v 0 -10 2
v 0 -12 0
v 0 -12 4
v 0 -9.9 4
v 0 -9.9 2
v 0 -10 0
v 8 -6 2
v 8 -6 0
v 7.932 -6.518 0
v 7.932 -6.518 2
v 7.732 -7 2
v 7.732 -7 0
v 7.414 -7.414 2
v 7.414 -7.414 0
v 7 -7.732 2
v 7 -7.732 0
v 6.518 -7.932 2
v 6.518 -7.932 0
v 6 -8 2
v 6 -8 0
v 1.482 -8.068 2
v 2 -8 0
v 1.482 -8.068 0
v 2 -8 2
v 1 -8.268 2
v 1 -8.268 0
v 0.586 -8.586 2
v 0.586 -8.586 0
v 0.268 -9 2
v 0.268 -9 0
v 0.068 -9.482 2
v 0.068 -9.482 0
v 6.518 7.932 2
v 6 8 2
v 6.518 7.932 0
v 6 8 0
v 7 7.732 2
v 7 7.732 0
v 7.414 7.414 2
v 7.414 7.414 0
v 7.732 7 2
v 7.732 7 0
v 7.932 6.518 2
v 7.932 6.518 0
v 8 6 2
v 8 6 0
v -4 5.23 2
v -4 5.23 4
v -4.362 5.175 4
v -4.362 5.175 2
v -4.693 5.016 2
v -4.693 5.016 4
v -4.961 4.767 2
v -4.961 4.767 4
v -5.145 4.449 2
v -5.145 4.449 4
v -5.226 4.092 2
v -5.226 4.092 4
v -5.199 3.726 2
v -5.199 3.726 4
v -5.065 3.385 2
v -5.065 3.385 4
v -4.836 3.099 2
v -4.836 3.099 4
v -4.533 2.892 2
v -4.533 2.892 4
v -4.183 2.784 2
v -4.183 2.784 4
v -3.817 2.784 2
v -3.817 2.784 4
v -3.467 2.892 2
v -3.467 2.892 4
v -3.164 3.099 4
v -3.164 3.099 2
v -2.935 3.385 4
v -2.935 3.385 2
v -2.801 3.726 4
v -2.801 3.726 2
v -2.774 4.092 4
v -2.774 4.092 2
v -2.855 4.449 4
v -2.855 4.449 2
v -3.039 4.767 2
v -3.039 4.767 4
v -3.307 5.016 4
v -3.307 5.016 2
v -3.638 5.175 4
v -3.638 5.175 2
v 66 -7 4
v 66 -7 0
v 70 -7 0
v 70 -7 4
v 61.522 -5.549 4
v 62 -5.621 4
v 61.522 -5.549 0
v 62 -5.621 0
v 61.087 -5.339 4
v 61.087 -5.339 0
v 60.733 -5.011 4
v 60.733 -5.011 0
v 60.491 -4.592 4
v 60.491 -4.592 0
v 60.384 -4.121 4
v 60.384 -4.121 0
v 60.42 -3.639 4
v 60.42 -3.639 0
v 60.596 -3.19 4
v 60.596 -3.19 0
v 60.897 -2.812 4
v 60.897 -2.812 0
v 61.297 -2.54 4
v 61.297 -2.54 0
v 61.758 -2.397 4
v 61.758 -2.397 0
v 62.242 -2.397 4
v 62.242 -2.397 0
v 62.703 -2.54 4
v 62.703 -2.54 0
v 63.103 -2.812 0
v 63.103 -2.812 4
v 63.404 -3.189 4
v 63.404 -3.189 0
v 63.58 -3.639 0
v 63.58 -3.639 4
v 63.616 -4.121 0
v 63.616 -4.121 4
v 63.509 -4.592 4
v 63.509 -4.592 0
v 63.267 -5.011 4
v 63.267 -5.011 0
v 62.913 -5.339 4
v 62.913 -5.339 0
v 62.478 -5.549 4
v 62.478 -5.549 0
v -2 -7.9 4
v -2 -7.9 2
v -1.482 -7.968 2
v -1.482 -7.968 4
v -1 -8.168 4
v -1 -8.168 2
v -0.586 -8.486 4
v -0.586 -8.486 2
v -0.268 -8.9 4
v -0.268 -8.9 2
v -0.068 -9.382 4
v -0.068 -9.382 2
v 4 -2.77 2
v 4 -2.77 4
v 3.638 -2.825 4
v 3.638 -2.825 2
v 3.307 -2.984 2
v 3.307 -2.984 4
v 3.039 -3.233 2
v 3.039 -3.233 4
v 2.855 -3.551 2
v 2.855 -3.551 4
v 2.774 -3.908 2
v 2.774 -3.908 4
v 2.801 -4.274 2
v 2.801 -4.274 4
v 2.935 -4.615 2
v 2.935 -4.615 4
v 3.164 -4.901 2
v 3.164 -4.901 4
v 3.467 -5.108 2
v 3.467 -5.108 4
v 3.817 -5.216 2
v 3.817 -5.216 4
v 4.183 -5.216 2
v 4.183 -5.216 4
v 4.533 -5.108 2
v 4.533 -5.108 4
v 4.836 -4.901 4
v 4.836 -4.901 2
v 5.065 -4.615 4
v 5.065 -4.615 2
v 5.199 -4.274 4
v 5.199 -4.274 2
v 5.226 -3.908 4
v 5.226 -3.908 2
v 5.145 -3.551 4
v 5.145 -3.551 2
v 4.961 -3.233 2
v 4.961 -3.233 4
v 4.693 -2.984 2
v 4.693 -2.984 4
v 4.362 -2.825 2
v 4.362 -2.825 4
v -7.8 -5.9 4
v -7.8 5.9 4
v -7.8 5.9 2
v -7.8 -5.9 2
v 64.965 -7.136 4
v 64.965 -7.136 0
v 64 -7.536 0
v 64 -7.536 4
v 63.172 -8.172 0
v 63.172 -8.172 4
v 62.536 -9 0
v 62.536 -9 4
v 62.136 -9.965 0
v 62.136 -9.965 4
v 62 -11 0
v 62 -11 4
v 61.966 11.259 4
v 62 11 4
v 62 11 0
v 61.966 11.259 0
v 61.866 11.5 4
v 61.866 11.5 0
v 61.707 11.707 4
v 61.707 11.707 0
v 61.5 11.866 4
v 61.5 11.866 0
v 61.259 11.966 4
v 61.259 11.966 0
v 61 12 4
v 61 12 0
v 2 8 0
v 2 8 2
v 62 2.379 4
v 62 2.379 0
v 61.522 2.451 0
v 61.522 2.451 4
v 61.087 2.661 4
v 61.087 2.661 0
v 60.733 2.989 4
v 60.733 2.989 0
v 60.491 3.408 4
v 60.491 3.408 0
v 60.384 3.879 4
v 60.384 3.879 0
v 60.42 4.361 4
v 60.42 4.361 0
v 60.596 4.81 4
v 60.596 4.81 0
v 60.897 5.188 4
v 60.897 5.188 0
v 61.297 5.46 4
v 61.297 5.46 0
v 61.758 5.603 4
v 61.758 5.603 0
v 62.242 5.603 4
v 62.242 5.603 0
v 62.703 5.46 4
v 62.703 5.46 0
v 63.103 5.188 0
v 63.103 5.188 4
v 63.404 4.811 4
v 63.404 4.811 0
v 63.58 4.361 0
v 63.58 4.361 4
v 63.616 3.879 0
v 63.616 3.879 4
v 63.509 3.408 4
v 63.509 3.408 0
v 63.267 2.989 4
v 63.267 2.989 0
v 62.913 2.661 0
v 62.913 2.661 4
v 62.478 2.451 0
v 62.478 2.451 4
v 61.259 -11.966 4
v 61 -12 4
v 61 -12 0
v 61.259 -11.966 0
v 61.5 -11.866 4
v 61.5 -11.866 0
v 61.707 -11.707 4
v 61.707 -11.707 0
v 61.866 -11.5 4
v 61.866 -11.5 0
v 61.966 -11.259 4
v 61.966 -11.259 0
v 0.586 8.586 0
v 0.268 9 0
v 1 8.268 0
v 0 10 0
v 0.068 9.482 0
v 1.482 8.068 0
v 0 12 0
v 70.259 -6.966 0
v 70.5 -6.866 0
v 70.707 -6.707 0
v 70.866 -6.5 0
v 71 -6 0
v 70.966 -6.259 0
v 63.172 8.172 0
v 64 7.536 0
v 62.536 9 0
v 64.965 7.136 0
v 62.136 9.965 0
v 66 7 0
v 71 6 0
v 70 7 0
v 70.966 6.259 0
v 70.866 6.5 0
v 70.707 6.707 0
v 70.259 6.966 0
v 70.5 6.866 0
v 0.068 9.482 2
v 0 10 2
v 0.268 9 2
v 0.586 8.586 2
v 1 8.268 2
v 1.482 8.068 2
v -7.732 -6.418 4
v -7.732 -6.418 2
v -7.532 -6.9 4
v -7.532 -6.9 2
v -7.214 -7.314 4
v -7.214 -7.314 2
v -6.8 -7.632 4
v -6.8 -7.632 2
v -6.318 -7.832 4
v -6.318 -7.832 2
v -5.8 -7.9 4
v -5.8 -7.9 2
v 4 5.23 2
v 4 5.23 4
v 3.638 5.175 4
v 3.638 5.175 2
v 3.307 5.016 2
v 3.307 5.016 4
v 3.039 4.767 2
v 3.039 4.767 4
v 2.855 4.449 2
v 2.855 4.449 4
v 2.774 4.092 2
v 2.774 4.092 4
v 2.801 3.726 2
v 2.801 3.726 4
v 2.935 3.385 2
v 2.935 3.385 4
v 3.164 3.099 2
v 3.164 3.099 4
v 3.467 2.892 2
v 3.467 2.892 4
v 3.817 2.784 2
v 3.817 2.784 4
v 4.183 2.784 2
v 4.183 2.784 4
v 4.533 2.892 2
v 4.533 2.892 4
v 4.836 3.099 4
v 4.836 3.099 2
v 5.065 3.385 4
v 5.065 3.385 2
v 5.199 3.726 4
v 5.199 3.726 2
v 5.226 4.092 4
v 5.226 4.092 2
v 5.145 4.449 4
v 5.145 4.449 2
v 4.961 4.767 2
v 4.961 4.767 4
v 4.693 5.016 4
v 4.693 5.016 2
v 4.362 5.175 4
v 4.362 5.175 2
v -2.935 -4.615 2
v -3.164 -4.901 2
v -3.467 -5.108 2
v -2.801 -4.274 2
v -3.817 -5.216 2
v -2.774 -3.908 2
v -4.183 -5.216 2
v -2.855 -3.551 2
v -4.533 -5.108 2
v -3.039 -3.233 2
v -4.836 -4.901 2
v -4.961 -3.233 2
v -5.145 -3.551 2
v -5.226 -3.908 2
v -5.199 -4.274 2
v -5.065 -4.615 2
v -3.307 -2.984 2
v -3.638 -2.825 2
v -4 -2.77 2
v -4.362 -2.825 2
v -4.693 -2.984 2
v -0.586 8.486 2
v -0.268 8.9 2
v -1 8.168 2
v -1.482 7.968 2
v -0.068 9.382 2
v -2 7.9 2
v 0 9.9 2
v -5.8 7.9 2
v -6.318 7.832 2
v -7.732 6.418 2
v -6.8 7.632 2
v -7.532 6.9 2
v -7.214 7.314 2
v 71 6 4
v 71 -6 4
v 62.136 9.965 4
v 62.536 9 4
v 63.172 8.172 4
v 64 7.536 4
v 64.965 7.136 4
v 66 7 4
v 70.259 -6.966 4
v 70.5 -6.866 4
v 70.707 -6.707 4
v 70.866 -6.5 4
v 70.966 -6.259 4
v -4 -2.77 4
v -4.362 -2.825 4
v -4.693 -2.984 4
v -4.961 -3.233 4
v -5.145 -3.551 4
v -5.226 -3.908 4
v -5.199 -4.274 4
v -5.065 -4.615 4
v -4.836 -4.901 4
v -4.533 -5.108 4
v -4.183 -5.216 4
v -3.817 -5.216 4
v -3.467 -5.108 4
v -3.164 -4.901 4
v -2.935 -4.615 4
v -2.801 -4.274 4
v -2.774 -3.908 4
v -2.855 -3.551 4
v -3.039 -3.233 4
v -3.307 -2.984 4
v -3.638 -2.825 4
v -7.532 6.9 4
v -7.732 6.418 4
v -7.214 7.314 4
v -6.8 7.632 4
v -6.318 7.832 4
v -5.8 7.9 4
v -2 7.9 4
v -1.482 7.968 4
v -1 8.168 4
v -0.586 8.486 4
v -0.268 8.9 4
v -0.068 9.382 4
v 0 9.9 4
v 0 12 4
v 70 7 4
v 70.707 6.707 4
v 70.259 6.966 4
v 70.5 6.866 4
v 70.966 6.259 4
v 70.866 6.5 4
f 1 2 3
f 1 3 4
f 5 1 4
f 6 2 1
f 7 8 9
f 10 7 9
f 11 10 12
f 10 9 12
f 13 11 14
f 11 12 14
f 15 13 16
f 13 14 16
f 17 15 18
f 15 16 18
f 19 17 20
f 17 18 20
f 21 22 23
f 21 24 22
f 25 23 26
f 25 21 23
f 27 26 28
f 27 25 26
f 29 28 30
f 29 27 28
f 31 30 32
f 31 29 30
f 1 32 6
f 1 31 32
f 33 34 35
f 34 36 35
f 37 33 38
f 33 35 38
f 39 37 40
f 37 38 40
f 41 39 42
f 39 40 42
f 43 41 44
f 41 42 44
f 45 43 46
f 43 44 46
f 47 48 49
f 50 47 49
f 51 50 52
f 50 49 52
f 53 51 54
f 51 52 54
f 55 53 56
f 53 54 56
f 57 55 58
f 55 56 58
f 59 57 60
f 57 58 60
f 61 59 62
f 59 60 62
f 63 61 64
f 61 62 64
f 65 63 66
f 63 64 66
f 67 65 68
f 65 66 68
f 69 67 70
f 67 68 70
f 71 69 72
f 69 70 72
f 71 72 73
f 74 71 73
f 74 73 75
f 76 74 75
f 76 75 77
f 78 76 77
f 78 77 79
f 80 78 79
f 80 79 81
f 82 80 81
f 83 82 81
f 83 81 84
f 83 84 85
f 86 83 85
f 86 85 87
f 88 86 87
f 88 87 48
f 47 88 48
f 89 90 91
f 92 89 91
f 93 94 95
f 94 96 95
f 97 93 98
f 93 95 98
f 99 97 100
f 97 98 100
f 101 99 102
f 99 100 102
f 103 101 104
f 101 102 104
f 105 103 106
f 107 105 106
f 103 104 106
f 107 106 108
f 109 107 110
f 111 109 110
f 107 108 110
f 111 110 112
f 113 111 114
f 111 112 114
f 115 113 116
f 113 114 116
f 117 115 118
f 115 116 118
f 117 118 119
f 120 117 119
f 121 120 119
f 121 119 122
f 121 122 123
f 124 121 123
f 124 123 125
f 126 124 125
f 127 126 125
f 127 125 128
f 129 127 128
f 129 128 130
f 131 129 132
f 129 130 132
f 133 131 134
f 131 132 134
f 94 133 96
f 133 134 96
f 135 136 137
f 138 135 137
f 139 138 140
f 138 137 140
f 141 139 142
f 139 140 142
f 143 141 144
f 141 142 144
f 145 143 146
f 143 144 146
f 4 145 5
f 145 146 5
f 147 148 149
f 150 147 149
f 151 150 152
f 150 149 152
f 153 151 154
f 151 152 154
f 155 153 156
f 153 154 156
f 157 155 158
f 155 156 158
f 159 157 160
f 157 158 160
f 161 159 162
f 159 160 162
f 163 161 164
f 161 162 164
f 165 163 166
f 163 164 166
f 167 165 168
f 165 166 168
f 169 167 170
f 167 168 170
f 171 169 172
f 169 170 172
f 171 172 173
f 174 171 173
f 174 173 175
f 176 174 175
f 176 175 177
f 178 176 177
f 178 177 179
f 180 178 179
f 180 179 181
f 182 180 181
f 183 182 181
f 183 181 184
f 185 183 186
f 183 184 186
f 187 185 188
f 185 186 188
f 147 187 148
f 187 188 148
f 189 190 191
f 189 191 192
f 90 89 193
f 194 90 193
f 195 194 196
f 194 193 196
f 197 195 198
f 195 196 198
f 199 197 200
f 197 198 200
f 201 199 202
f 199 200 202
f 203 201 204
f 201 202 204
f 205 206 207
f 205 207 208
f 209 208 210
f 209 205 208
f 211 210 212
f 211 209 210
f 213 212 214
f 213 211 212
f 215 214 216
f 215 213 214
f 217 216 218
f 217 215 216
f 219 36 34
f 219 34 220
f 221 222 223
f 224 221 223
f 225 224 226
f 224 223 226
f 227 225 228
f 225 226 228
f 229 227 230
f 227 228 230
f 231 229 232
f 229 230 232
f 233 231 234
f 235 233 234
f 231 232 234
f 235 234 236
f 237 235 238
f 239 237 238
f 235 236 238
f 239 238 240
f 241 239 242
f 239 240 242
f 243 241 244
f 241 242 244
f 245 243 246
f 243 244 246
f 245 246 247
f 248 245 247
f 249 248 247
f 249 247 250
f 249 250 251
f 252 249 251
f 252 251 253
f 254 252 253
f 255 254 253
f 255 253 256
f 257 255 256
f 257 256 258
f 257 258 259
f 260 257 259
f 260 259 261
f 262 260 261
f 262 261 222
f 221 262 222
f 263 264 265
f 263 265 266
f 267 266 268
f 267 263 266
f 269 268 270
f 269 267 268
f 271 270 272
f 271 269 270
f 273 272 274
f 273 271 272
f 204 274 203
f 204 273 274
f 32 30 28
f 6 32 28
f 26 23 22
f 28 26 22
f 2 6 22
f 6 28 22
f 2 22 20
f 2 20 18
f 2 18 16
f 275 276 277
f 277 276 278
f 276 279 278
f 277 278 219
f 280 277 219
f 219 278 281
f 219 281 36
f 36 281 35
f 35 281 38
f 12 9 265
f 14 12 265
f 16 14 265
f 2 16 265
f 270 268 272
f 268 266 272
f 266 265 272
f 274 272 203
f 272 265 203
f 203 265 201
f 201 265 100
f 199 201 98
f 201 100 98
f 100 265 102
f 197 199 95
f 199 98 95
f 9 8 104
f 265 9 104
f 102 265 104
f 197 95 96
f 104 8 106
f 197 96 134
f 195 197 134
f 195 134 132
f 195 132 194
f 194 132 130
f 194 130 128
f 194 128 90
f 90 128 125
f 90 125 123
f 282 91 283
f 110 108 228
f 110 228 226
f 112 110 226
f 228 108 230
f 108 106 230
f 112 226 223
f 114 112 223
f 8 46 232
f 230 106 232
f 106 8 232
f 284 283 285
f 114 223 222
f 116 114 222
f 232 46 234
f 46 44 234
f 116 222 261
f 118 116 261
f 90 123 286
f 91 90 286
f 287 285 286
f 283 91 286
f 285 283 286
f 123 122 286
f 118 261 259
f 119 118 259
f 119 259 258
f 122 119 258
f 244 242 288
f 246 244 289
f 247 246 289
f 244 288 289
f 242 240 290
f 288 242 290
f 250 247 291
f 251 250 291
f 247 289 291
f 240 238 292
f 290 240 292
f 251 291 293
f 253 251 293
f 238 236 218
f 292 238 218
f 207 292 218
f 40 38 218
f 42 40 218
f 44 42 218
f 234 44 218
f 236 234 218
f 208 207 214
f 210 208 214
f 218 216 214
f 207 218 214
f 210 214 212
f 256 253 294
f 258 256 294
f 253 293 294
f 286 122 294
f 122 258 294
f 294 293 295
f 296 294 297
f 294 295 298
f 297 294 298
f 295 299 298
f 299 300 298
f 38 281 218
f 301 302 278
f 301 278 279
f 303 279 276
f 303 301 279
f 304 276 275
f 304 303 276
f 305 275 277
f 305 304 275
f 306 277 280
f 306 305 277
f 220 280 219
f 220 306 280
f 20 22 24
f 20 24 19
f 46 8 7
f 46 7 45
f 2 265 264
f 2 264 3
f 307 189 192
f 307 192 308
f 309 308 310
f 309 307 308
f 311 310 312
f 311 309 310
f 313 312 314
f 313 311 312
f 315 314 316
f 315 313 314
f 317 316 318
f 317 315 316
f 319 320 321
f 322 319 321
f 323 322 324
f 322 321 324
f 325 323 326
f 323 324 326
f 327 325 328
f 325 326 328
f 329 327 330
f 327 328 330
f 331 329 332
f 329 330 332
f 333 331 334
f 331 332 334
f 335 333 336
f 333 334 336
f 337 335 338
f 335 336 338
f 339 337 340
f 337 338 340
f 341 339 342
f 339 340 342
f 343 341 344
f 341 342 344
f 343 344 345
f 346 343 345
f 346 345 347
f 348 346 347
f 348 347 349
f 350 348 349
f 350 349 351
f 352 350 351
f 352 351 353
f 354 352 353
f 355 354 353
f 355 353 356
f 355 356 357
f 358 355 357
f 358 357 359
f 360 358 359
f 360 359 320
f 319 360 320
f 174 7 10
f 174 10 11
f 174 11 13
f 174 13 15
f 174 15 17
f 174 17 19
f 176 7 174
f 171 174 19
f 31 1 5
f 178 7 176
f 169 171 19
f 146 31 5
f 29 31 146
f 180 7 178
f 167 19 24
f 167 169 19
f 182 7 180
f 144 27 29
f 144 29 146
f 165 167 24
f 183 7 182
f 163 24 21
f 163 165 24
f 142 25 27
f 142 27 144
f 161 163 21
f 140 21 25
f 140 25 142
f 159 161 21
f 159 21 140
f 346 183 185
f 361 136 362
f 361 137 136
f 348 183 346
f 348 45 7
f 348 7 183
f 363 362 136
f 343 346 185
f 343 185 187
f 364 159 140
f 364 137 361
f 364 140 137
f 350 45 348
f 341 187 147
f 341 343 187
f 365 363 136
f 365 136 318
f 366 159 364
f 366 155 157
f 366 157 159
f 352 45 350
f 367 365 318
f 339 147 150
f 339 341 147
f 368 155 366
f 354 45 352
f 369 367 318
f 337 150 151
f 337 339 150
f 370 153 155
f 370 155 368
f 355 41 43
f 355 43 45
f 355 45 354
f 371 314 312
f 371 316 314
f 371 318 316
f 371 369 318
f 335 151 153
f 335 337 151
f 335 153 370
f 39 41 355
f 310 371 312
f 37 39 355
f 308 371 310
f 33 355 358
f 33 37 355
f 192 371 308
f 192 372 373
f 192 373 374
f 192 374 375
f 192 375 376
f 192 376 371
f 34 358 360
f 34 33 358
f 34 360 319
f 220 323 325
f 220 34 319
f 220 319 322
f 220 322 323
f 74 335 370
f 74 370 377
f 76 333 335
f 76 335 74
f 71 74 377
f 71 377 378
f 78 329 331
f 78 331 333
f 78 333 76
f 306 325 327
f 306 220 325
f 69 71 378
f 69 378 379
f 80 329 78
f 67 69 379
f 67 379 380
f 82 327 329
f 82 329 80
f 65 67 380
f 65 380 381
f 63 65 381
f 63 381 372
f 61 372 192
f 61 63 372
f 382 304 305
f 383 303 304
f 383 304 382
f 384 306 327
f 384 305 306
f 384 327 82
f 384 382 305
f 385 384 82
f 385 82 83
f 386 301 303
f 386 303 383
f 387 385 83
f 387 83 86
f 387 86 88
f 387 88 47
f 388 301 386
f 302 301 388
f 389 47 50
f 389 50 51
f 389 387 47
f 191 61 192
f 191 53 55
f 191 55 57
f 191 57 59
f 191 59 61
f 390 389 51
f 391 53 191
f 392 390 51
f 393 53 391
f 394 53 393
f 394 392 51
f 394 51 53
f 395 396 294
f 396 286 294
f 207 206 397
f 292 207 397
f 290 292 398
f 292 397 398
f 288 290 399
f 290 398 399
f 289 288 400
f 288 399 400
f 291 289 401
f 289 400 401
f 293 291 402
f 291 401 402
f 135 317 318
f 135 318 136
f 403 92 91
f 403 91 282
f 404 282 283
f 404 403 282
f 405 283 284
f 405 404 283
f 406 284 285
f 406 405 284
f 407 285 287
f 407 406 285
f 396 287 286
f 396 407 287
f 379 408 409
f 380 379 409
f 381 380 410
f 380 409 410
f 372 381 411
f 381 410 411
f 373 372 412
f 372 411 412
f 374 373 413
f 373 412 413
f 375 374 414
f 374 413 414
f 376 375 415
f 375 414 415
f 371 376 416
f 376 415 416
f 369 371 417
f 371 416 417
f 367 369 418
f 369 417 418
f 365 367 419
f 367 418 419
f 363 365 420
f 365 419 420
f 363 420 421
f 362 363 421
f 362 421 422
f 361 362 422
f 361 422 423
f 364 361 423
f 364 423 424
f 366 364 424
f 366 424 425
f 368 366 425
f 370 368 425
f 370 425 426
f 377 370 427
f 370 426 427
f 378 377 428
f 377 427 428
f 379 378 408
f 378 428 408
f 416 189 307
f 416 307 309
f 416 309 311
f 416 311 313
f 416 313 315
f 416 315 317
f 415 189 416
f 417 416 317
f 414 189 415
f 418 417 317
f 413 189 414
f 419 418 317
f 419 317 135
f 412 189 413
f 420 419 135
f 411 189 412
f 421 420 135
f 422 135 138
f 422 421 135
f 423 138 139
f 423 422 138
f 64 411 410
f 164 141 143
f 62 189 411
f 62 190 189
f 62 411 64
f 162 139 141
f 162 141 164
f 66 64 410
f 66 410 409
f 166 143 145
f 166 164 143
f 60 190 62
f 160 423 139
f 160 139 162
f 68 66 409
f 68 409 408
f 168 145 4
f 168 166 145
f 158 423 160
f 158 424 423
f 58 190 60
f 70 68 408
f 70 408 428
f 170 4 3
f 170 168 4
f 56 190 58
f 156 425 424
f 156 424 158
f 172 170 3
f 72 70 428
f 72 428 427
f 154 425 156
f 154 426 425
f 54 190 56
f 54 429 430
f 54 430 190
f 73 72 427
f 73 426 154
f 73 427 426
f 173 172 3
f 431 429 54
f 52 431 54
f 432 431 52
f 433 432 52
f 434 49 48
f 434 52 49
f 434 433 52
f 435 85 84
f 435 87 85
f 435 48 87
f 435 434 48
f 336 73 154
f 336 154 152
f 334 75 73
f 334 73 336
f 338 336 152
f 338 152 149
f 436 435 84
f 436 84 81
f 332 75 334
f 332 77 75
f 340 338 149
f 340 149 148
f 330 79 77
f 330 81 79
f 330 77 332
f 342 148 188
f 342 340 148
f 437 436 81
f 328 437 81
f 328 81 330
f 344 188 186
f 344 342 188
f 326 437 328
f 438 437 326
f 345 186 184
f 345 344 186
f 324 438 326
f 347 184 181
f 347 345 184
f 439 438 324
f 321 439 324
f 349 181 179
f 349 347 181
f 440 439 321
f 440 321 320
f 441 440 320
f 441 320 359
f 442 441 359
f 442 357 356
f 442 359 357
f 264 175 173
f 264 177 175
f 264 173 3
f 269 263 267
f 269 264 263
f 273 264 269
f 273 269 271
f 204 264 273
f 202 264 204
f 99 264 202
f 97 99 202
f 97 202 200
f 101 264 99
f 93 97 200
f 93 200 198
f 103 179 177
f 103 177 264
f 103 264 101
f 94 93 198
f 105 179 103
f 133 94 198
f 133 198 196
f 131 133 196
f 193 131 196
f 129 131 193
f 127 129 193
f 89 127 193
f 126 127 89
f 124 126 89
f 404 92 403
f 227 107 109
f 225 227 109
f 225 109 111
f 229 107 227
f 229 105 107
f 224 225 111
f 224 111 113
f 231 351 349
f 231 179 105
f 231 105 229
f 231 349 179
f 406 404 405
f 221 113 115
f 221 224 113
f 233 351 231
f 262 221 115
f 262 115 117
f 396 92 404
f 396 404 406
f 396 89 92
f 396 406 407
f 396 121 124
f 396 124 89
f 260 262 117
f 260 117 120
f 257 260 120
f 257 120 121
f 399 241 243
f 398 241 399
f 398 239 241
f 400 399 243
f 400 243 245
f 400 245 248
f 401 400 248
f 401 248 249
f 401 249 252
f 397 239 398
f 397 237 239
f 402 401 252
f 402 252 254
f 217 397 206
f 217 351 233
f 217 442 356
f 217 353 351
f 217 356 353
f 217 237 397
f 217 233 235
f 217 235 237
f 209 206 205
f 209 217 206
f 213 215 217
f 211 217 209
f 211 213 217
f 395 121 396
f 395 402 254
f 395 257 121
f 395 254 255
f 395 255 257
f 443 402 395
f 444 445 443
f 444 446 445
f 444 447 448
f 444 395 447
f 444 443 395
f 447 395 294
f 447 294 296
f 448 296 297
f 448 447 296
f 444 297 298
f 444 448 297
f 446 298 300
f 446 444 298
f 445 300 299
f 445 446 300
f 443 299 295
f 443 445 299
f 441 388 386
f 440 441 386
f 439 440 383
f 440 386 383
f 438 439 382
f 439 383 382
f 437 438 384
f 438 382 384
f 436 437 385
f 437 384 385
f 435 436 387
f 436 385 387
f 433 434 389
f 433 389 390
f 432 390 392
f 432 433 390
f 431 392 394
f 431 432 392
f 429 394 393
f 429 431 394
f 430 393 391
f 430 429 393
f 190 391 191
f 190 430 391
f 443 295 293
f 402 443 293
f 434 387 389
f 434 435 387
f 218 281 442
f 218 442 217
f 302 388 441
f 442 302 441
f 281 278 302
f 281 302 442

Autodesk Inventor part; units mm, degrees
ref_plane "YZ Plane" through (0, 0, 0) normal (1, 0, 0) x (0, 1, 0)
ref_plane "XZ Plane" through (0, 0, 0) normal (0, 1, 0) x (-1, 0, 0)
ref_plane "XY Plane" through (0, 0, 0) normal (0, 0, 1) x (1, 0, 0)
sketch "Skizze1" plane through (0, 0, 0) normal (0, 0, 1) x (1, 0, 0)
  line L0 (0, 12) -> (62, 12)
  line L1 (62, -12) -> (0, -12)
  line L2 (0, -12) -> (0, 12)
  line L3 (-14.2, 0) -> (85.2, 0) projected
  line L4 (62, -7) -> (71, -7)
  line L5 (71, -7) -> (71, 7)
  line L6 (71, 7) -> (62, 7)
  line L7 (62, 12) -> (62, 7)
  line L8 (62, -7) -> (62, -12)
  point P0 (0, 0)
  dimension "d0" = 24
  dimension "d1" = 62
  dimension "d29" = 14
  dimension "d30" = 9
extrude "Extrusion1" add sketch "Skizze1" along normal blind 4
sketch "Skizze5" plane through (0, 0, 0) normal (0, 0, -1) x (-1, 0, 0)
  line L0 (0, -12) -> (0, 12) construction
  line L1 (-85.2, 0) -> (14.2, 0) construction
  line L2 (0, 12) -> (0, -12) projected
  line L3 (0, -8) -> (-6, -8)
  line L4 (-8, -6) -> (-8, 6)
  line L5 (-6, 8) -> (0, 8)
  line L6 (0, 8) -> (0, -8)
  arc A0 (-8, -6) -> (-6, -8) centre (-6, -6) ccw
  arc A1 (-6, 8) -> (-8, 6) centre (-6, 6) ccw
  point P0 (0, 0)
  dimension "d37" = 2
  dimension "d38" = 4
  dimension "d39" = 8
extrude "Extrusion3" cut sketch "Skizze5" against normal blind 2
sketch "Skizze6" plane through (0, 0, 4) normal (0, 0, 1) x (1, 0, 0)
  line L0 (0, 12) -> (0, -12) construction
  line L1 (-24.0571, 0) -> (86.8428, 0) construction
  line L2 (0, 7.9) -> (-5.8, 7.9)
  line L3 (-7.8, 5.9) -> (-7.8, -5.9)
  line L4 (-5.8, -7.9) -> (0, -7.9)
  line L5 (0, -7.9) -> (0, 7.9)
  arc A0 (-5.8, 7.9) -> (-7.8, 5.9) centre (-5.8, 5.9) ccw
  arc A1 (-7.8, -5.9) -> (-5.8, -7.9) centre (-5.8, -5.9) ccw
  point P0 (0, 0)
  dimension "d42" = 2
  dimension "d43" = 4.1
  dimension "d44" = 7.8
extrude "Extrusion4" add sketch "Skizze6" against normal blind 2
sketch "Skizze2" plane through (0, 0, 4) normal (0, 0, 1) x (1, 0, 0)
  line L0 (62, 12) -> (0, 12) projected
  line L1 (0, 12) -> (0, -12) projected
  line L2 (0, 12) -> (4, 12)
  line L3 (4, 12) -> (4, -12)
  line L4 (4, -12) -> (0, -12)
  line L5 (0, -12) -> (0, 12)
  point P0 (0, 0)
  dimension "d4" = 4
extrude "Extrusion2" [suppressed]
sketch "Skizze3" plane through (0, 0, 2) normal (0, 0, 1) x (1, 0, 0)
  line L0 (0, 16.8) -> (0, -16.8) projected
  line L1 (-15, 0) -> (90, 0) projected
  point P0 (0, 0)
  point P1 (2, 0)
  dimension "d7" = 2
hole "Bohrung1" [suppressed]
pattern_linear "Rechteckige Anordnung1" [suppressed]
sketch "Skizze4" plane through (0, 0, 4) normal (0, 0, 1) x (1, 0, 0)
  line L0 (-14.2, 0) -> (85.2, 0) projected
  line L1 (62, -12) -> (62, 12) projected
  line L2 (71, -7) -> (71, 7) construction
  point P0 (0, 0)
  point P1 (62, 4)
  point P2 (62, -4)
  dimension "d31" = 8
  dimension "d36" = 0
hole "Bohrung2" at (62, -4, 4) at (62, 4, 4) direction (0, 0, -1) diameter 3.242 end through all thread size "M4x0.7" class "6H" standard "ISO Metric profile"
fillet "Rundung1" radius 4 2 edges at (62, -7, 2) (62, 7, 2)
fillet "Rundung2" radius 1 4 edges at (62, -12, 2) (62, 12, 2) (71, -7, 2) (71, 7, 2)
sketch "Skizze7" plane through (0, 0, 0) normal (0, 0, 1) x (1, 0, 0)
  line L0 (-4, -4) -> (4, -4) construction
  line L1 (4, -4) -> (4, 4) construction
  line L2 (4, 4) -> (-4, 4) construction
  line L3 (-4, 4) -> (-4, -4) construction
  line L4 (0, 5.6) -> (0, -5.6) construction
  line L5 (-5.6, 0) -> (5.6, 0) construction
  point P0 (0, 0)
  dimension "d48" = 8
  dimension "d49" = 8
hole "Bohrung3" at (4, -4, 0) at (4, 4, 0) at (-4, 4, 0) at (-4, -4, 0) direction (0, 0, 1) diameter 2.459 end through all thread size "M3x0.5" class "6H" standard "ISO Metric profile"
fillet "Rundung3" radius 2 4 edges at (0, -8, 1) (0, 8, 1) (0, 7.9, 3) (0, -7.9, 3)
properties part number "Kicker Eisen" material "Stahl, unlegiert"
